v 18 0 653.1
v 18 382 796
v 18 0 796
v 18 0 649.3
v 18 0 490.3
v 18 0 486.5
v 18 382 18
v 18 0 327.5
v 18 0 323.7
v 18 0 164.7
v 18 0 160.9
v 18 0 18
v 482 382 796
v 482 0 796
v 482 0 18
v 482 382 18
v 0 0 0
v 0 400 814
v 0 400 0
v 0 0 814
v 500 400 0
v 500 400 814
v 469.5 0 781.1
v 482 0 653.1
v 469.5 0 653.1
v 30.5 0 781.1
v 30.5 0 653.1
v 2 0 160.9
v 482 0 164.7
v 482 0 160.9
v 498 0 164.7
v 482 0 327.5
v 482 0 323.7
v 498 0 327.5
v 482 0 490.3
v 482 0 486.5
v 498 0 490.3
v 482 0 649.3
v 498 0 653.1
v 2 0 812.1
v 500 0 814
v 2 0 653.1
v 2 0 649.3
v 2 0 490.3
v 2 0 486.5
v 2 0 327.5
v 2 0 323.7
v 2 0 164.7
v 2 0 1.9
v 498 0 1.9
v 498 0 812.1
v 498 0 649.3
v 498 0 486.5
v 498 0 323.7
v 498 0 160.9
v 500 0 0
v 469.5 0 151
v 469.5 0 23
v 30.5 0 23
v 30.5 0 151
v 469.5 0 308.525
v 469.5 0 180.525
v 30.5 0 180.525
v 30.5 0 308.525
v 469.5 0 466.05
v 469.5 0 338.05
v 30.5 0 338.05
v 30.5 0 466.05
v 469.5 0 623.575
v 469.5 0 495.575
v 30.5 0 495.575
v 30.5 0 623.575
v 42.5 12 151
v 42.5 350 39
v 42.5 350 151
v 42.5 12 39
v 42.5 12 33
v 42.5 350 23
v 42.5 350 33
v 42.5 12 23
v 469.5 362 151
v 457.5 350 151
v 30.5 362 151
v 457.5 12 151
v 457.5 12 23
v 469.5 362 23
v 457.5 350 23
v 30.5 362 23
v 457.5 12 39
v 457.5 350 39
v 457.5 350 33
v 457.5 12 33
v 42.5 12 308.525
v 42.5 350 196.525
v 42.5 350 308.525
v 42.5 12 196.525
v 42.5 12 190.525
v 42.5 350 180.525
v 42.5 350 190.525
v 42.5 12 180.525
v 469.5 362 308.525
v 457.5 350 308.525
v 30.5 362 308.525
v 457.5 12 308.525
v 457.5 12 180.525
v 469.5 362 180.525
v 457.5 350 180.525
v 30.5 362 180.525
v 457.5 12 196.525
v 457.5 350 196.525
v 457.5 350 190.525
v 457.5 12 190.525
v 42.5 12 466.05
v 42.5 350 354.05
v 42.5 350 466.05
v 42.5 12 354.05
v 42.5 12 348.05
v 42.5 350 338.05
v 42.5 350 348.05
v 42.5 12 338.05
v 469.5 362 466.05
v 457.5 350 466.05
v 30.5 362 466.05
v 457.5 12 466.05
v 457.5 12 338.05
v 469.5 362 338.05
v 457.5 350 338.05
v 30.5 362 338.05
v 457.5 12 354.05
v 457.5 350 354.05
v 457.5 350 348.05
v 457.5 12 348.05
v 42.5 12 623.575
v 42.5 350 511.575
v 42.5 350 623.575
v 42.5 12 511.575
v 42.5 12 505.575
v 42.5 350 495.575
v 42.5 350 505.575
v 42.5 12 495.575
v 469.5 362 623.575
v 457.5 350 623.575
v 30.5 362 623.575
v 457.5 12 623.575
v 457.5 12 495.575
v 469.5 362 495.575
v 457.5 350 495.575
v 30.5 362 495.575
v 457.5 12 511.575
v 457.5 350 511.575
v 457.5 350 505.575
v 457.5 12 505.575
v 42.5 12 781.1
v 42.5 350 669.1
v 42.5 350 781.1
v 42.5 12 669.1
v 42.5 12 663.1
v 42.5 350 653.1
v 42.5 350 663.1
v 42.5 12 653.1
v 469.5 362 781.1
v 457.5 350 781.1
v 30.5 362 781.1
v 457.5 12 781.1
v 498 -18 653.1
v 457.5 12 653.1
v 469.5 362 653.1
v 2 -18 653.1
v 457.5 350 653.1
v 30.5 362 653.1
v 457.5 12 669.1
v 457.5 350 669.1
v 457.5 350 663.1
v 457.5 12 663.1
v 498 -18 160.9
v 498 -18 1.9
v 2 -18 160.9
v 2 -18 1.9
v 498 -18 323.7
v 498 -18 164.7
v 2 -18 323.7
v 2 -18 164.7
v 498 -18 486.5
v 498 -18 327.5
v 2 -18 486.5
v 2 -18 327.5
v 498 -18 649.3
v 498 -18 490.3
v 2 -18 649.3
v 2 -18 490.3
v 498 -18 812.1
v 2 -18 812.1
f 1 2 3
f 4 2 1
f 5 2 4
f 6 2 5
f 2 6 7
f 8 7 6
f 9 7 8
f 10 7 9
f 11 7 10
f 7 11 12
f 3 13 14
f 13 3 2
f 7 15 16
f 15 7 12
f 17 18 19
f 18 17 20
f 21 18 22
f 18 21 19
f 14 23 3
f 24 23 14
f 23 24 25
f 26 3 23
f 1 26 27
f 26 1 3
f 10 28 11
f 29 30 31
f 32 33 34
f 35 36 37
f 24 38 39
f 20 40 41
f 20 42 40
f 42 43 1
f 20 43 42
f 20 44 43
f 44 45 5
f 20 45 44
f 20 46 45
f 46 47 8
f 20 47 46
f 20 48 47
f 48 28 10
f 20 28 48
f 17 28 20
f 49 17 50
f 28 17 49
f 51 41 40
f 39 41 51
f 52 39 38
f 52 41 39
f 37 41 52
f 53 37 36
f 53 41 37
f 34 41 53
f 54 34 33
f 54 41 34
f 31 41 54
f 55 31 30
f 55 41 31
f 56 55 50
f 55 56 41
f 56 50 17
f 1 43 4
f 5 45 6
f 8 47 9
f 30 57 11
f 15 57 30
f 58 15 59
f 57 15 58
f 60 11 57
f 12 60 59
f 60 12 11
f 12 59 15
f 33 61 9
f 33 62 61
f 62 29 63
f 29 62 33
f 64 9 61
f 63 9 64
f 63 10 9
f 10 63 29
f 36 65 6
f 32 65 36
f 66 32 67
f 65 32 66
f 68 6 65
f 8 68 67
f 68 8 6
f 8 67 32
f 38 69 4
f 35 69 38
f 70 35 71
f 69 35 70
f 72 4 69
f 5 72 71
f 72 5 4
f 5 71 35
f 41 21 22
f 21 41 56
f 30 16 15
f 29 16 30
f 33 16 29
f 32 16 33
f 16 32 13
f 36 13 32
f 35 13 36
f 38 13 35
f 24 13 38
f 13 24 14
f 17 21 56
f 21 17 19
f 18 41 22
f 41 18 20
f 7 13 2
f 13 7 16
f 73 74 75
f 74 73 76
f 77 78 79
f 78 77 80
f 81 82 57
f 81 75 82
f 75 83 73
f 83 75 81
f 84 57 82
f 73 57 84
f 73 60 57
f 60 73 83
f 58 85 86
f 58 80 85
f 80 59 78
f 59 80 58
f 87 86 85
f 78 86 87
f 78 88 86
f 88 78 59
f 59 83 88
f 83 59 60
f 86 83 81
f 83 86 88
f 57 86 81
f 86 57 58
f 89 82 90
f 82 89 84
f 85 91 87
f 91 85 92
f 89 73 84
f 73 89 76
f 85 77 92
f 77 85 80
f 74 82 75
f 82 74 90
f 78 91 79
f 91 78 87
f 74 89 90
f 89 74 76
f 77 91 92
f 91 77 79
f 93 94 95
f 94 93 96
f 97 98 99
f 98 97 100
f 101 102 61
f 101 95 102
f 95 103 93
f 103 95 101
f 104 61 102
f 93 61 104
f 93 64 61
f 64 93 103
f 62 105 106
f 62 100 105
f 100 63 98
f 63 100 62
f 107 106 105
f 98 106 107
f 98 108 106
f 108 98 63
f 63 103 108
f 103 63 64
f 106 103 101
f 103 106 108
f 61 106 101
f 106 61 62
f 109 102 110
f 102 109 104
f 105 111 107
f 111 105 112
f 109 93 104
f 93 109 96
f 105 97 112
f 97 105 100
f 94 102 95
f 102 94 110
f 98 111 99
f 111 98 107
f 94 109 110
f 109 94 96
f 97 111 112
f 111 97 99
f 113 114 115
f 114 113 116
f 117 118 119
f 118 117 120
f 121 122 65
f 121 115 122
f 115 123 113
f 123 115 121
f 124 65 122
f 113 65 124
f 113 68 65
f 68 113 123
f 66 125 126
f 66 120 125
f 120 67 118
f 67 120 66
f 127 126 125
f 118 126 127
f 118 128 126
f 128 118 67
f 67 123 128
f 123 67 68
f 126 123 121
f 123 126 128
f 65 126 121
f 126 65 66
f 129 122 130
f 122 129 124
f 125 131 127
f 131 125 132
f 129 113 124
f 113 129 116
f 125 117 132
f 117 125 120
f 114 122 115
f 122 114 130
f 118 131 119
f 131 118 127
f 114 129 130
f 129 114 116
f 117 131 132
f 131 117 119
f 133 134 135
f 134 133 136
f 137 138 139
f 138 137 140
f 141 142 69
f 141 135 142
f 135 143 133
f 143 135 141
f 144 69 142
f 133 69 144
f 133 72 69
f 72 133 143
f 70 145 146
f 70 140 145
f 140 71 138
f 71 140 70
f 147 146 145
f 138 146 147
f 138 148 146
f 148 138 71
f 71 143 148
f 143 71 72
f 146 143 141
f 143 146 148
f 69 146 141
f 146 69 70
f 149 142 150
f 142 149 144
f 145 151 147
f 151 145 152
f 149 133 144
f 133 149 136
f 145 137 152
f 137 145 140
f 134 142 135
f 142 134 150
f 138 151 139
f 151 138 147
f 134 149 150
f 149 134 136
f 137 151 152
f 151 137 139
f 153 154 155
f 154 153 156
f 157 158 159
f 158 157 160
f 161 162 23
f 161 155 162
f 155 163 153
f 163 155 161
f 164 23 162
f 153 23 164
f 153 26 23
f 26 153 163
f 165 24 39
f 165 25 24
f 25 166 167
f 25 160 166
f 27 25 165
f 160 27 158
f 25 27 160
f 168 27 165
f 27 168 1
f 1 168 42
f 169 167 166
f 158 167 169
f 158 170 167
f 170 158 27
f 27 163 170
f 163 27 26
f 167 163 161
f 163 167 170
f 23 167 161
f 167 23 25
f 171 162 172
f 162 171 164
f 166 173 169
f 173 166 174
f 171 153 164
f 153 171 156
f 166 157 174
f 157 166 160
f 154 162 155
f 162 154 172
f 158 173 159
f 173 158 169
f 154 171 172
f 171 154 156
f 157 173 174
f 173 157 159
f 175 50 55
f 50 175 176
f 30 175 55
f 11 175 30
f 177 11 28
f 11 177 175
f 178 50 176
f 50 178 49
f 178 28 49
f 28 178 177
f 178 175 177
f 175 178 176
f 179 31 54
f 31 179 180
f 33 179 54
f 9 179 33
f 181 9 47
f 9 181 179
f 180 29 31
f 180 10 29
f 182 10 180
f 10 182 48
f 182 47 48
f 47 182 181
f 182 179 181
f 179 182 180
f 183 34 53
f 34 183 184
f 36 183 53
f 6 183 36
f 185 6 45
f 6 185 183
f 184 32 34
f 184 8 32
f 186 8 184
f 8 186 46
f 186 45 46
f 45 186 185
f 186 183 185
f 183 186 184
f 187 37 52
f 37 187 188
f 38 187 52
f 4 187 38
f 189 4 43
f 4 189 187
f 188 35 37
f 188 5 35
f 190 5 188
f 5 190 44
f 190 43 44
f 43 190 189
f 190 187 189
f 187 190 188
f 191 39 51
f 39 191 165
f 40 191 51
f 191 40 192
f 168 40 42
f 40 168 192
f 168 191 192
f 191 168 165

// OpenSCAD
// Rolling cabinet with drawers.
// All logic (layout, model, parts list) comes from cupboard-library.scad.
include <../../library/cupboard.scad>

hasDoor = false;
largeDrawers = 0; //1:3; 2:1
smallDrawers = 5; // 5||3||1
drawerSideClearance = 12.5;
drawerTopClearance = 15;
drawerBottomClearance = 5;
drawerDepthClearance = 20;
drawerThickness = 12;

drawerEnclosed = false;

wheelHeight = 108;

frontClearance = 4;
height = 922;
width = 500;
depth = 400;
thickness = 18;

// Number of drawer compartments side by side, separated by dividers of corpus thickness
compartments = 1;

material = "MDF";
pricePerQM = 19.32;

cupboard();
partsList();
